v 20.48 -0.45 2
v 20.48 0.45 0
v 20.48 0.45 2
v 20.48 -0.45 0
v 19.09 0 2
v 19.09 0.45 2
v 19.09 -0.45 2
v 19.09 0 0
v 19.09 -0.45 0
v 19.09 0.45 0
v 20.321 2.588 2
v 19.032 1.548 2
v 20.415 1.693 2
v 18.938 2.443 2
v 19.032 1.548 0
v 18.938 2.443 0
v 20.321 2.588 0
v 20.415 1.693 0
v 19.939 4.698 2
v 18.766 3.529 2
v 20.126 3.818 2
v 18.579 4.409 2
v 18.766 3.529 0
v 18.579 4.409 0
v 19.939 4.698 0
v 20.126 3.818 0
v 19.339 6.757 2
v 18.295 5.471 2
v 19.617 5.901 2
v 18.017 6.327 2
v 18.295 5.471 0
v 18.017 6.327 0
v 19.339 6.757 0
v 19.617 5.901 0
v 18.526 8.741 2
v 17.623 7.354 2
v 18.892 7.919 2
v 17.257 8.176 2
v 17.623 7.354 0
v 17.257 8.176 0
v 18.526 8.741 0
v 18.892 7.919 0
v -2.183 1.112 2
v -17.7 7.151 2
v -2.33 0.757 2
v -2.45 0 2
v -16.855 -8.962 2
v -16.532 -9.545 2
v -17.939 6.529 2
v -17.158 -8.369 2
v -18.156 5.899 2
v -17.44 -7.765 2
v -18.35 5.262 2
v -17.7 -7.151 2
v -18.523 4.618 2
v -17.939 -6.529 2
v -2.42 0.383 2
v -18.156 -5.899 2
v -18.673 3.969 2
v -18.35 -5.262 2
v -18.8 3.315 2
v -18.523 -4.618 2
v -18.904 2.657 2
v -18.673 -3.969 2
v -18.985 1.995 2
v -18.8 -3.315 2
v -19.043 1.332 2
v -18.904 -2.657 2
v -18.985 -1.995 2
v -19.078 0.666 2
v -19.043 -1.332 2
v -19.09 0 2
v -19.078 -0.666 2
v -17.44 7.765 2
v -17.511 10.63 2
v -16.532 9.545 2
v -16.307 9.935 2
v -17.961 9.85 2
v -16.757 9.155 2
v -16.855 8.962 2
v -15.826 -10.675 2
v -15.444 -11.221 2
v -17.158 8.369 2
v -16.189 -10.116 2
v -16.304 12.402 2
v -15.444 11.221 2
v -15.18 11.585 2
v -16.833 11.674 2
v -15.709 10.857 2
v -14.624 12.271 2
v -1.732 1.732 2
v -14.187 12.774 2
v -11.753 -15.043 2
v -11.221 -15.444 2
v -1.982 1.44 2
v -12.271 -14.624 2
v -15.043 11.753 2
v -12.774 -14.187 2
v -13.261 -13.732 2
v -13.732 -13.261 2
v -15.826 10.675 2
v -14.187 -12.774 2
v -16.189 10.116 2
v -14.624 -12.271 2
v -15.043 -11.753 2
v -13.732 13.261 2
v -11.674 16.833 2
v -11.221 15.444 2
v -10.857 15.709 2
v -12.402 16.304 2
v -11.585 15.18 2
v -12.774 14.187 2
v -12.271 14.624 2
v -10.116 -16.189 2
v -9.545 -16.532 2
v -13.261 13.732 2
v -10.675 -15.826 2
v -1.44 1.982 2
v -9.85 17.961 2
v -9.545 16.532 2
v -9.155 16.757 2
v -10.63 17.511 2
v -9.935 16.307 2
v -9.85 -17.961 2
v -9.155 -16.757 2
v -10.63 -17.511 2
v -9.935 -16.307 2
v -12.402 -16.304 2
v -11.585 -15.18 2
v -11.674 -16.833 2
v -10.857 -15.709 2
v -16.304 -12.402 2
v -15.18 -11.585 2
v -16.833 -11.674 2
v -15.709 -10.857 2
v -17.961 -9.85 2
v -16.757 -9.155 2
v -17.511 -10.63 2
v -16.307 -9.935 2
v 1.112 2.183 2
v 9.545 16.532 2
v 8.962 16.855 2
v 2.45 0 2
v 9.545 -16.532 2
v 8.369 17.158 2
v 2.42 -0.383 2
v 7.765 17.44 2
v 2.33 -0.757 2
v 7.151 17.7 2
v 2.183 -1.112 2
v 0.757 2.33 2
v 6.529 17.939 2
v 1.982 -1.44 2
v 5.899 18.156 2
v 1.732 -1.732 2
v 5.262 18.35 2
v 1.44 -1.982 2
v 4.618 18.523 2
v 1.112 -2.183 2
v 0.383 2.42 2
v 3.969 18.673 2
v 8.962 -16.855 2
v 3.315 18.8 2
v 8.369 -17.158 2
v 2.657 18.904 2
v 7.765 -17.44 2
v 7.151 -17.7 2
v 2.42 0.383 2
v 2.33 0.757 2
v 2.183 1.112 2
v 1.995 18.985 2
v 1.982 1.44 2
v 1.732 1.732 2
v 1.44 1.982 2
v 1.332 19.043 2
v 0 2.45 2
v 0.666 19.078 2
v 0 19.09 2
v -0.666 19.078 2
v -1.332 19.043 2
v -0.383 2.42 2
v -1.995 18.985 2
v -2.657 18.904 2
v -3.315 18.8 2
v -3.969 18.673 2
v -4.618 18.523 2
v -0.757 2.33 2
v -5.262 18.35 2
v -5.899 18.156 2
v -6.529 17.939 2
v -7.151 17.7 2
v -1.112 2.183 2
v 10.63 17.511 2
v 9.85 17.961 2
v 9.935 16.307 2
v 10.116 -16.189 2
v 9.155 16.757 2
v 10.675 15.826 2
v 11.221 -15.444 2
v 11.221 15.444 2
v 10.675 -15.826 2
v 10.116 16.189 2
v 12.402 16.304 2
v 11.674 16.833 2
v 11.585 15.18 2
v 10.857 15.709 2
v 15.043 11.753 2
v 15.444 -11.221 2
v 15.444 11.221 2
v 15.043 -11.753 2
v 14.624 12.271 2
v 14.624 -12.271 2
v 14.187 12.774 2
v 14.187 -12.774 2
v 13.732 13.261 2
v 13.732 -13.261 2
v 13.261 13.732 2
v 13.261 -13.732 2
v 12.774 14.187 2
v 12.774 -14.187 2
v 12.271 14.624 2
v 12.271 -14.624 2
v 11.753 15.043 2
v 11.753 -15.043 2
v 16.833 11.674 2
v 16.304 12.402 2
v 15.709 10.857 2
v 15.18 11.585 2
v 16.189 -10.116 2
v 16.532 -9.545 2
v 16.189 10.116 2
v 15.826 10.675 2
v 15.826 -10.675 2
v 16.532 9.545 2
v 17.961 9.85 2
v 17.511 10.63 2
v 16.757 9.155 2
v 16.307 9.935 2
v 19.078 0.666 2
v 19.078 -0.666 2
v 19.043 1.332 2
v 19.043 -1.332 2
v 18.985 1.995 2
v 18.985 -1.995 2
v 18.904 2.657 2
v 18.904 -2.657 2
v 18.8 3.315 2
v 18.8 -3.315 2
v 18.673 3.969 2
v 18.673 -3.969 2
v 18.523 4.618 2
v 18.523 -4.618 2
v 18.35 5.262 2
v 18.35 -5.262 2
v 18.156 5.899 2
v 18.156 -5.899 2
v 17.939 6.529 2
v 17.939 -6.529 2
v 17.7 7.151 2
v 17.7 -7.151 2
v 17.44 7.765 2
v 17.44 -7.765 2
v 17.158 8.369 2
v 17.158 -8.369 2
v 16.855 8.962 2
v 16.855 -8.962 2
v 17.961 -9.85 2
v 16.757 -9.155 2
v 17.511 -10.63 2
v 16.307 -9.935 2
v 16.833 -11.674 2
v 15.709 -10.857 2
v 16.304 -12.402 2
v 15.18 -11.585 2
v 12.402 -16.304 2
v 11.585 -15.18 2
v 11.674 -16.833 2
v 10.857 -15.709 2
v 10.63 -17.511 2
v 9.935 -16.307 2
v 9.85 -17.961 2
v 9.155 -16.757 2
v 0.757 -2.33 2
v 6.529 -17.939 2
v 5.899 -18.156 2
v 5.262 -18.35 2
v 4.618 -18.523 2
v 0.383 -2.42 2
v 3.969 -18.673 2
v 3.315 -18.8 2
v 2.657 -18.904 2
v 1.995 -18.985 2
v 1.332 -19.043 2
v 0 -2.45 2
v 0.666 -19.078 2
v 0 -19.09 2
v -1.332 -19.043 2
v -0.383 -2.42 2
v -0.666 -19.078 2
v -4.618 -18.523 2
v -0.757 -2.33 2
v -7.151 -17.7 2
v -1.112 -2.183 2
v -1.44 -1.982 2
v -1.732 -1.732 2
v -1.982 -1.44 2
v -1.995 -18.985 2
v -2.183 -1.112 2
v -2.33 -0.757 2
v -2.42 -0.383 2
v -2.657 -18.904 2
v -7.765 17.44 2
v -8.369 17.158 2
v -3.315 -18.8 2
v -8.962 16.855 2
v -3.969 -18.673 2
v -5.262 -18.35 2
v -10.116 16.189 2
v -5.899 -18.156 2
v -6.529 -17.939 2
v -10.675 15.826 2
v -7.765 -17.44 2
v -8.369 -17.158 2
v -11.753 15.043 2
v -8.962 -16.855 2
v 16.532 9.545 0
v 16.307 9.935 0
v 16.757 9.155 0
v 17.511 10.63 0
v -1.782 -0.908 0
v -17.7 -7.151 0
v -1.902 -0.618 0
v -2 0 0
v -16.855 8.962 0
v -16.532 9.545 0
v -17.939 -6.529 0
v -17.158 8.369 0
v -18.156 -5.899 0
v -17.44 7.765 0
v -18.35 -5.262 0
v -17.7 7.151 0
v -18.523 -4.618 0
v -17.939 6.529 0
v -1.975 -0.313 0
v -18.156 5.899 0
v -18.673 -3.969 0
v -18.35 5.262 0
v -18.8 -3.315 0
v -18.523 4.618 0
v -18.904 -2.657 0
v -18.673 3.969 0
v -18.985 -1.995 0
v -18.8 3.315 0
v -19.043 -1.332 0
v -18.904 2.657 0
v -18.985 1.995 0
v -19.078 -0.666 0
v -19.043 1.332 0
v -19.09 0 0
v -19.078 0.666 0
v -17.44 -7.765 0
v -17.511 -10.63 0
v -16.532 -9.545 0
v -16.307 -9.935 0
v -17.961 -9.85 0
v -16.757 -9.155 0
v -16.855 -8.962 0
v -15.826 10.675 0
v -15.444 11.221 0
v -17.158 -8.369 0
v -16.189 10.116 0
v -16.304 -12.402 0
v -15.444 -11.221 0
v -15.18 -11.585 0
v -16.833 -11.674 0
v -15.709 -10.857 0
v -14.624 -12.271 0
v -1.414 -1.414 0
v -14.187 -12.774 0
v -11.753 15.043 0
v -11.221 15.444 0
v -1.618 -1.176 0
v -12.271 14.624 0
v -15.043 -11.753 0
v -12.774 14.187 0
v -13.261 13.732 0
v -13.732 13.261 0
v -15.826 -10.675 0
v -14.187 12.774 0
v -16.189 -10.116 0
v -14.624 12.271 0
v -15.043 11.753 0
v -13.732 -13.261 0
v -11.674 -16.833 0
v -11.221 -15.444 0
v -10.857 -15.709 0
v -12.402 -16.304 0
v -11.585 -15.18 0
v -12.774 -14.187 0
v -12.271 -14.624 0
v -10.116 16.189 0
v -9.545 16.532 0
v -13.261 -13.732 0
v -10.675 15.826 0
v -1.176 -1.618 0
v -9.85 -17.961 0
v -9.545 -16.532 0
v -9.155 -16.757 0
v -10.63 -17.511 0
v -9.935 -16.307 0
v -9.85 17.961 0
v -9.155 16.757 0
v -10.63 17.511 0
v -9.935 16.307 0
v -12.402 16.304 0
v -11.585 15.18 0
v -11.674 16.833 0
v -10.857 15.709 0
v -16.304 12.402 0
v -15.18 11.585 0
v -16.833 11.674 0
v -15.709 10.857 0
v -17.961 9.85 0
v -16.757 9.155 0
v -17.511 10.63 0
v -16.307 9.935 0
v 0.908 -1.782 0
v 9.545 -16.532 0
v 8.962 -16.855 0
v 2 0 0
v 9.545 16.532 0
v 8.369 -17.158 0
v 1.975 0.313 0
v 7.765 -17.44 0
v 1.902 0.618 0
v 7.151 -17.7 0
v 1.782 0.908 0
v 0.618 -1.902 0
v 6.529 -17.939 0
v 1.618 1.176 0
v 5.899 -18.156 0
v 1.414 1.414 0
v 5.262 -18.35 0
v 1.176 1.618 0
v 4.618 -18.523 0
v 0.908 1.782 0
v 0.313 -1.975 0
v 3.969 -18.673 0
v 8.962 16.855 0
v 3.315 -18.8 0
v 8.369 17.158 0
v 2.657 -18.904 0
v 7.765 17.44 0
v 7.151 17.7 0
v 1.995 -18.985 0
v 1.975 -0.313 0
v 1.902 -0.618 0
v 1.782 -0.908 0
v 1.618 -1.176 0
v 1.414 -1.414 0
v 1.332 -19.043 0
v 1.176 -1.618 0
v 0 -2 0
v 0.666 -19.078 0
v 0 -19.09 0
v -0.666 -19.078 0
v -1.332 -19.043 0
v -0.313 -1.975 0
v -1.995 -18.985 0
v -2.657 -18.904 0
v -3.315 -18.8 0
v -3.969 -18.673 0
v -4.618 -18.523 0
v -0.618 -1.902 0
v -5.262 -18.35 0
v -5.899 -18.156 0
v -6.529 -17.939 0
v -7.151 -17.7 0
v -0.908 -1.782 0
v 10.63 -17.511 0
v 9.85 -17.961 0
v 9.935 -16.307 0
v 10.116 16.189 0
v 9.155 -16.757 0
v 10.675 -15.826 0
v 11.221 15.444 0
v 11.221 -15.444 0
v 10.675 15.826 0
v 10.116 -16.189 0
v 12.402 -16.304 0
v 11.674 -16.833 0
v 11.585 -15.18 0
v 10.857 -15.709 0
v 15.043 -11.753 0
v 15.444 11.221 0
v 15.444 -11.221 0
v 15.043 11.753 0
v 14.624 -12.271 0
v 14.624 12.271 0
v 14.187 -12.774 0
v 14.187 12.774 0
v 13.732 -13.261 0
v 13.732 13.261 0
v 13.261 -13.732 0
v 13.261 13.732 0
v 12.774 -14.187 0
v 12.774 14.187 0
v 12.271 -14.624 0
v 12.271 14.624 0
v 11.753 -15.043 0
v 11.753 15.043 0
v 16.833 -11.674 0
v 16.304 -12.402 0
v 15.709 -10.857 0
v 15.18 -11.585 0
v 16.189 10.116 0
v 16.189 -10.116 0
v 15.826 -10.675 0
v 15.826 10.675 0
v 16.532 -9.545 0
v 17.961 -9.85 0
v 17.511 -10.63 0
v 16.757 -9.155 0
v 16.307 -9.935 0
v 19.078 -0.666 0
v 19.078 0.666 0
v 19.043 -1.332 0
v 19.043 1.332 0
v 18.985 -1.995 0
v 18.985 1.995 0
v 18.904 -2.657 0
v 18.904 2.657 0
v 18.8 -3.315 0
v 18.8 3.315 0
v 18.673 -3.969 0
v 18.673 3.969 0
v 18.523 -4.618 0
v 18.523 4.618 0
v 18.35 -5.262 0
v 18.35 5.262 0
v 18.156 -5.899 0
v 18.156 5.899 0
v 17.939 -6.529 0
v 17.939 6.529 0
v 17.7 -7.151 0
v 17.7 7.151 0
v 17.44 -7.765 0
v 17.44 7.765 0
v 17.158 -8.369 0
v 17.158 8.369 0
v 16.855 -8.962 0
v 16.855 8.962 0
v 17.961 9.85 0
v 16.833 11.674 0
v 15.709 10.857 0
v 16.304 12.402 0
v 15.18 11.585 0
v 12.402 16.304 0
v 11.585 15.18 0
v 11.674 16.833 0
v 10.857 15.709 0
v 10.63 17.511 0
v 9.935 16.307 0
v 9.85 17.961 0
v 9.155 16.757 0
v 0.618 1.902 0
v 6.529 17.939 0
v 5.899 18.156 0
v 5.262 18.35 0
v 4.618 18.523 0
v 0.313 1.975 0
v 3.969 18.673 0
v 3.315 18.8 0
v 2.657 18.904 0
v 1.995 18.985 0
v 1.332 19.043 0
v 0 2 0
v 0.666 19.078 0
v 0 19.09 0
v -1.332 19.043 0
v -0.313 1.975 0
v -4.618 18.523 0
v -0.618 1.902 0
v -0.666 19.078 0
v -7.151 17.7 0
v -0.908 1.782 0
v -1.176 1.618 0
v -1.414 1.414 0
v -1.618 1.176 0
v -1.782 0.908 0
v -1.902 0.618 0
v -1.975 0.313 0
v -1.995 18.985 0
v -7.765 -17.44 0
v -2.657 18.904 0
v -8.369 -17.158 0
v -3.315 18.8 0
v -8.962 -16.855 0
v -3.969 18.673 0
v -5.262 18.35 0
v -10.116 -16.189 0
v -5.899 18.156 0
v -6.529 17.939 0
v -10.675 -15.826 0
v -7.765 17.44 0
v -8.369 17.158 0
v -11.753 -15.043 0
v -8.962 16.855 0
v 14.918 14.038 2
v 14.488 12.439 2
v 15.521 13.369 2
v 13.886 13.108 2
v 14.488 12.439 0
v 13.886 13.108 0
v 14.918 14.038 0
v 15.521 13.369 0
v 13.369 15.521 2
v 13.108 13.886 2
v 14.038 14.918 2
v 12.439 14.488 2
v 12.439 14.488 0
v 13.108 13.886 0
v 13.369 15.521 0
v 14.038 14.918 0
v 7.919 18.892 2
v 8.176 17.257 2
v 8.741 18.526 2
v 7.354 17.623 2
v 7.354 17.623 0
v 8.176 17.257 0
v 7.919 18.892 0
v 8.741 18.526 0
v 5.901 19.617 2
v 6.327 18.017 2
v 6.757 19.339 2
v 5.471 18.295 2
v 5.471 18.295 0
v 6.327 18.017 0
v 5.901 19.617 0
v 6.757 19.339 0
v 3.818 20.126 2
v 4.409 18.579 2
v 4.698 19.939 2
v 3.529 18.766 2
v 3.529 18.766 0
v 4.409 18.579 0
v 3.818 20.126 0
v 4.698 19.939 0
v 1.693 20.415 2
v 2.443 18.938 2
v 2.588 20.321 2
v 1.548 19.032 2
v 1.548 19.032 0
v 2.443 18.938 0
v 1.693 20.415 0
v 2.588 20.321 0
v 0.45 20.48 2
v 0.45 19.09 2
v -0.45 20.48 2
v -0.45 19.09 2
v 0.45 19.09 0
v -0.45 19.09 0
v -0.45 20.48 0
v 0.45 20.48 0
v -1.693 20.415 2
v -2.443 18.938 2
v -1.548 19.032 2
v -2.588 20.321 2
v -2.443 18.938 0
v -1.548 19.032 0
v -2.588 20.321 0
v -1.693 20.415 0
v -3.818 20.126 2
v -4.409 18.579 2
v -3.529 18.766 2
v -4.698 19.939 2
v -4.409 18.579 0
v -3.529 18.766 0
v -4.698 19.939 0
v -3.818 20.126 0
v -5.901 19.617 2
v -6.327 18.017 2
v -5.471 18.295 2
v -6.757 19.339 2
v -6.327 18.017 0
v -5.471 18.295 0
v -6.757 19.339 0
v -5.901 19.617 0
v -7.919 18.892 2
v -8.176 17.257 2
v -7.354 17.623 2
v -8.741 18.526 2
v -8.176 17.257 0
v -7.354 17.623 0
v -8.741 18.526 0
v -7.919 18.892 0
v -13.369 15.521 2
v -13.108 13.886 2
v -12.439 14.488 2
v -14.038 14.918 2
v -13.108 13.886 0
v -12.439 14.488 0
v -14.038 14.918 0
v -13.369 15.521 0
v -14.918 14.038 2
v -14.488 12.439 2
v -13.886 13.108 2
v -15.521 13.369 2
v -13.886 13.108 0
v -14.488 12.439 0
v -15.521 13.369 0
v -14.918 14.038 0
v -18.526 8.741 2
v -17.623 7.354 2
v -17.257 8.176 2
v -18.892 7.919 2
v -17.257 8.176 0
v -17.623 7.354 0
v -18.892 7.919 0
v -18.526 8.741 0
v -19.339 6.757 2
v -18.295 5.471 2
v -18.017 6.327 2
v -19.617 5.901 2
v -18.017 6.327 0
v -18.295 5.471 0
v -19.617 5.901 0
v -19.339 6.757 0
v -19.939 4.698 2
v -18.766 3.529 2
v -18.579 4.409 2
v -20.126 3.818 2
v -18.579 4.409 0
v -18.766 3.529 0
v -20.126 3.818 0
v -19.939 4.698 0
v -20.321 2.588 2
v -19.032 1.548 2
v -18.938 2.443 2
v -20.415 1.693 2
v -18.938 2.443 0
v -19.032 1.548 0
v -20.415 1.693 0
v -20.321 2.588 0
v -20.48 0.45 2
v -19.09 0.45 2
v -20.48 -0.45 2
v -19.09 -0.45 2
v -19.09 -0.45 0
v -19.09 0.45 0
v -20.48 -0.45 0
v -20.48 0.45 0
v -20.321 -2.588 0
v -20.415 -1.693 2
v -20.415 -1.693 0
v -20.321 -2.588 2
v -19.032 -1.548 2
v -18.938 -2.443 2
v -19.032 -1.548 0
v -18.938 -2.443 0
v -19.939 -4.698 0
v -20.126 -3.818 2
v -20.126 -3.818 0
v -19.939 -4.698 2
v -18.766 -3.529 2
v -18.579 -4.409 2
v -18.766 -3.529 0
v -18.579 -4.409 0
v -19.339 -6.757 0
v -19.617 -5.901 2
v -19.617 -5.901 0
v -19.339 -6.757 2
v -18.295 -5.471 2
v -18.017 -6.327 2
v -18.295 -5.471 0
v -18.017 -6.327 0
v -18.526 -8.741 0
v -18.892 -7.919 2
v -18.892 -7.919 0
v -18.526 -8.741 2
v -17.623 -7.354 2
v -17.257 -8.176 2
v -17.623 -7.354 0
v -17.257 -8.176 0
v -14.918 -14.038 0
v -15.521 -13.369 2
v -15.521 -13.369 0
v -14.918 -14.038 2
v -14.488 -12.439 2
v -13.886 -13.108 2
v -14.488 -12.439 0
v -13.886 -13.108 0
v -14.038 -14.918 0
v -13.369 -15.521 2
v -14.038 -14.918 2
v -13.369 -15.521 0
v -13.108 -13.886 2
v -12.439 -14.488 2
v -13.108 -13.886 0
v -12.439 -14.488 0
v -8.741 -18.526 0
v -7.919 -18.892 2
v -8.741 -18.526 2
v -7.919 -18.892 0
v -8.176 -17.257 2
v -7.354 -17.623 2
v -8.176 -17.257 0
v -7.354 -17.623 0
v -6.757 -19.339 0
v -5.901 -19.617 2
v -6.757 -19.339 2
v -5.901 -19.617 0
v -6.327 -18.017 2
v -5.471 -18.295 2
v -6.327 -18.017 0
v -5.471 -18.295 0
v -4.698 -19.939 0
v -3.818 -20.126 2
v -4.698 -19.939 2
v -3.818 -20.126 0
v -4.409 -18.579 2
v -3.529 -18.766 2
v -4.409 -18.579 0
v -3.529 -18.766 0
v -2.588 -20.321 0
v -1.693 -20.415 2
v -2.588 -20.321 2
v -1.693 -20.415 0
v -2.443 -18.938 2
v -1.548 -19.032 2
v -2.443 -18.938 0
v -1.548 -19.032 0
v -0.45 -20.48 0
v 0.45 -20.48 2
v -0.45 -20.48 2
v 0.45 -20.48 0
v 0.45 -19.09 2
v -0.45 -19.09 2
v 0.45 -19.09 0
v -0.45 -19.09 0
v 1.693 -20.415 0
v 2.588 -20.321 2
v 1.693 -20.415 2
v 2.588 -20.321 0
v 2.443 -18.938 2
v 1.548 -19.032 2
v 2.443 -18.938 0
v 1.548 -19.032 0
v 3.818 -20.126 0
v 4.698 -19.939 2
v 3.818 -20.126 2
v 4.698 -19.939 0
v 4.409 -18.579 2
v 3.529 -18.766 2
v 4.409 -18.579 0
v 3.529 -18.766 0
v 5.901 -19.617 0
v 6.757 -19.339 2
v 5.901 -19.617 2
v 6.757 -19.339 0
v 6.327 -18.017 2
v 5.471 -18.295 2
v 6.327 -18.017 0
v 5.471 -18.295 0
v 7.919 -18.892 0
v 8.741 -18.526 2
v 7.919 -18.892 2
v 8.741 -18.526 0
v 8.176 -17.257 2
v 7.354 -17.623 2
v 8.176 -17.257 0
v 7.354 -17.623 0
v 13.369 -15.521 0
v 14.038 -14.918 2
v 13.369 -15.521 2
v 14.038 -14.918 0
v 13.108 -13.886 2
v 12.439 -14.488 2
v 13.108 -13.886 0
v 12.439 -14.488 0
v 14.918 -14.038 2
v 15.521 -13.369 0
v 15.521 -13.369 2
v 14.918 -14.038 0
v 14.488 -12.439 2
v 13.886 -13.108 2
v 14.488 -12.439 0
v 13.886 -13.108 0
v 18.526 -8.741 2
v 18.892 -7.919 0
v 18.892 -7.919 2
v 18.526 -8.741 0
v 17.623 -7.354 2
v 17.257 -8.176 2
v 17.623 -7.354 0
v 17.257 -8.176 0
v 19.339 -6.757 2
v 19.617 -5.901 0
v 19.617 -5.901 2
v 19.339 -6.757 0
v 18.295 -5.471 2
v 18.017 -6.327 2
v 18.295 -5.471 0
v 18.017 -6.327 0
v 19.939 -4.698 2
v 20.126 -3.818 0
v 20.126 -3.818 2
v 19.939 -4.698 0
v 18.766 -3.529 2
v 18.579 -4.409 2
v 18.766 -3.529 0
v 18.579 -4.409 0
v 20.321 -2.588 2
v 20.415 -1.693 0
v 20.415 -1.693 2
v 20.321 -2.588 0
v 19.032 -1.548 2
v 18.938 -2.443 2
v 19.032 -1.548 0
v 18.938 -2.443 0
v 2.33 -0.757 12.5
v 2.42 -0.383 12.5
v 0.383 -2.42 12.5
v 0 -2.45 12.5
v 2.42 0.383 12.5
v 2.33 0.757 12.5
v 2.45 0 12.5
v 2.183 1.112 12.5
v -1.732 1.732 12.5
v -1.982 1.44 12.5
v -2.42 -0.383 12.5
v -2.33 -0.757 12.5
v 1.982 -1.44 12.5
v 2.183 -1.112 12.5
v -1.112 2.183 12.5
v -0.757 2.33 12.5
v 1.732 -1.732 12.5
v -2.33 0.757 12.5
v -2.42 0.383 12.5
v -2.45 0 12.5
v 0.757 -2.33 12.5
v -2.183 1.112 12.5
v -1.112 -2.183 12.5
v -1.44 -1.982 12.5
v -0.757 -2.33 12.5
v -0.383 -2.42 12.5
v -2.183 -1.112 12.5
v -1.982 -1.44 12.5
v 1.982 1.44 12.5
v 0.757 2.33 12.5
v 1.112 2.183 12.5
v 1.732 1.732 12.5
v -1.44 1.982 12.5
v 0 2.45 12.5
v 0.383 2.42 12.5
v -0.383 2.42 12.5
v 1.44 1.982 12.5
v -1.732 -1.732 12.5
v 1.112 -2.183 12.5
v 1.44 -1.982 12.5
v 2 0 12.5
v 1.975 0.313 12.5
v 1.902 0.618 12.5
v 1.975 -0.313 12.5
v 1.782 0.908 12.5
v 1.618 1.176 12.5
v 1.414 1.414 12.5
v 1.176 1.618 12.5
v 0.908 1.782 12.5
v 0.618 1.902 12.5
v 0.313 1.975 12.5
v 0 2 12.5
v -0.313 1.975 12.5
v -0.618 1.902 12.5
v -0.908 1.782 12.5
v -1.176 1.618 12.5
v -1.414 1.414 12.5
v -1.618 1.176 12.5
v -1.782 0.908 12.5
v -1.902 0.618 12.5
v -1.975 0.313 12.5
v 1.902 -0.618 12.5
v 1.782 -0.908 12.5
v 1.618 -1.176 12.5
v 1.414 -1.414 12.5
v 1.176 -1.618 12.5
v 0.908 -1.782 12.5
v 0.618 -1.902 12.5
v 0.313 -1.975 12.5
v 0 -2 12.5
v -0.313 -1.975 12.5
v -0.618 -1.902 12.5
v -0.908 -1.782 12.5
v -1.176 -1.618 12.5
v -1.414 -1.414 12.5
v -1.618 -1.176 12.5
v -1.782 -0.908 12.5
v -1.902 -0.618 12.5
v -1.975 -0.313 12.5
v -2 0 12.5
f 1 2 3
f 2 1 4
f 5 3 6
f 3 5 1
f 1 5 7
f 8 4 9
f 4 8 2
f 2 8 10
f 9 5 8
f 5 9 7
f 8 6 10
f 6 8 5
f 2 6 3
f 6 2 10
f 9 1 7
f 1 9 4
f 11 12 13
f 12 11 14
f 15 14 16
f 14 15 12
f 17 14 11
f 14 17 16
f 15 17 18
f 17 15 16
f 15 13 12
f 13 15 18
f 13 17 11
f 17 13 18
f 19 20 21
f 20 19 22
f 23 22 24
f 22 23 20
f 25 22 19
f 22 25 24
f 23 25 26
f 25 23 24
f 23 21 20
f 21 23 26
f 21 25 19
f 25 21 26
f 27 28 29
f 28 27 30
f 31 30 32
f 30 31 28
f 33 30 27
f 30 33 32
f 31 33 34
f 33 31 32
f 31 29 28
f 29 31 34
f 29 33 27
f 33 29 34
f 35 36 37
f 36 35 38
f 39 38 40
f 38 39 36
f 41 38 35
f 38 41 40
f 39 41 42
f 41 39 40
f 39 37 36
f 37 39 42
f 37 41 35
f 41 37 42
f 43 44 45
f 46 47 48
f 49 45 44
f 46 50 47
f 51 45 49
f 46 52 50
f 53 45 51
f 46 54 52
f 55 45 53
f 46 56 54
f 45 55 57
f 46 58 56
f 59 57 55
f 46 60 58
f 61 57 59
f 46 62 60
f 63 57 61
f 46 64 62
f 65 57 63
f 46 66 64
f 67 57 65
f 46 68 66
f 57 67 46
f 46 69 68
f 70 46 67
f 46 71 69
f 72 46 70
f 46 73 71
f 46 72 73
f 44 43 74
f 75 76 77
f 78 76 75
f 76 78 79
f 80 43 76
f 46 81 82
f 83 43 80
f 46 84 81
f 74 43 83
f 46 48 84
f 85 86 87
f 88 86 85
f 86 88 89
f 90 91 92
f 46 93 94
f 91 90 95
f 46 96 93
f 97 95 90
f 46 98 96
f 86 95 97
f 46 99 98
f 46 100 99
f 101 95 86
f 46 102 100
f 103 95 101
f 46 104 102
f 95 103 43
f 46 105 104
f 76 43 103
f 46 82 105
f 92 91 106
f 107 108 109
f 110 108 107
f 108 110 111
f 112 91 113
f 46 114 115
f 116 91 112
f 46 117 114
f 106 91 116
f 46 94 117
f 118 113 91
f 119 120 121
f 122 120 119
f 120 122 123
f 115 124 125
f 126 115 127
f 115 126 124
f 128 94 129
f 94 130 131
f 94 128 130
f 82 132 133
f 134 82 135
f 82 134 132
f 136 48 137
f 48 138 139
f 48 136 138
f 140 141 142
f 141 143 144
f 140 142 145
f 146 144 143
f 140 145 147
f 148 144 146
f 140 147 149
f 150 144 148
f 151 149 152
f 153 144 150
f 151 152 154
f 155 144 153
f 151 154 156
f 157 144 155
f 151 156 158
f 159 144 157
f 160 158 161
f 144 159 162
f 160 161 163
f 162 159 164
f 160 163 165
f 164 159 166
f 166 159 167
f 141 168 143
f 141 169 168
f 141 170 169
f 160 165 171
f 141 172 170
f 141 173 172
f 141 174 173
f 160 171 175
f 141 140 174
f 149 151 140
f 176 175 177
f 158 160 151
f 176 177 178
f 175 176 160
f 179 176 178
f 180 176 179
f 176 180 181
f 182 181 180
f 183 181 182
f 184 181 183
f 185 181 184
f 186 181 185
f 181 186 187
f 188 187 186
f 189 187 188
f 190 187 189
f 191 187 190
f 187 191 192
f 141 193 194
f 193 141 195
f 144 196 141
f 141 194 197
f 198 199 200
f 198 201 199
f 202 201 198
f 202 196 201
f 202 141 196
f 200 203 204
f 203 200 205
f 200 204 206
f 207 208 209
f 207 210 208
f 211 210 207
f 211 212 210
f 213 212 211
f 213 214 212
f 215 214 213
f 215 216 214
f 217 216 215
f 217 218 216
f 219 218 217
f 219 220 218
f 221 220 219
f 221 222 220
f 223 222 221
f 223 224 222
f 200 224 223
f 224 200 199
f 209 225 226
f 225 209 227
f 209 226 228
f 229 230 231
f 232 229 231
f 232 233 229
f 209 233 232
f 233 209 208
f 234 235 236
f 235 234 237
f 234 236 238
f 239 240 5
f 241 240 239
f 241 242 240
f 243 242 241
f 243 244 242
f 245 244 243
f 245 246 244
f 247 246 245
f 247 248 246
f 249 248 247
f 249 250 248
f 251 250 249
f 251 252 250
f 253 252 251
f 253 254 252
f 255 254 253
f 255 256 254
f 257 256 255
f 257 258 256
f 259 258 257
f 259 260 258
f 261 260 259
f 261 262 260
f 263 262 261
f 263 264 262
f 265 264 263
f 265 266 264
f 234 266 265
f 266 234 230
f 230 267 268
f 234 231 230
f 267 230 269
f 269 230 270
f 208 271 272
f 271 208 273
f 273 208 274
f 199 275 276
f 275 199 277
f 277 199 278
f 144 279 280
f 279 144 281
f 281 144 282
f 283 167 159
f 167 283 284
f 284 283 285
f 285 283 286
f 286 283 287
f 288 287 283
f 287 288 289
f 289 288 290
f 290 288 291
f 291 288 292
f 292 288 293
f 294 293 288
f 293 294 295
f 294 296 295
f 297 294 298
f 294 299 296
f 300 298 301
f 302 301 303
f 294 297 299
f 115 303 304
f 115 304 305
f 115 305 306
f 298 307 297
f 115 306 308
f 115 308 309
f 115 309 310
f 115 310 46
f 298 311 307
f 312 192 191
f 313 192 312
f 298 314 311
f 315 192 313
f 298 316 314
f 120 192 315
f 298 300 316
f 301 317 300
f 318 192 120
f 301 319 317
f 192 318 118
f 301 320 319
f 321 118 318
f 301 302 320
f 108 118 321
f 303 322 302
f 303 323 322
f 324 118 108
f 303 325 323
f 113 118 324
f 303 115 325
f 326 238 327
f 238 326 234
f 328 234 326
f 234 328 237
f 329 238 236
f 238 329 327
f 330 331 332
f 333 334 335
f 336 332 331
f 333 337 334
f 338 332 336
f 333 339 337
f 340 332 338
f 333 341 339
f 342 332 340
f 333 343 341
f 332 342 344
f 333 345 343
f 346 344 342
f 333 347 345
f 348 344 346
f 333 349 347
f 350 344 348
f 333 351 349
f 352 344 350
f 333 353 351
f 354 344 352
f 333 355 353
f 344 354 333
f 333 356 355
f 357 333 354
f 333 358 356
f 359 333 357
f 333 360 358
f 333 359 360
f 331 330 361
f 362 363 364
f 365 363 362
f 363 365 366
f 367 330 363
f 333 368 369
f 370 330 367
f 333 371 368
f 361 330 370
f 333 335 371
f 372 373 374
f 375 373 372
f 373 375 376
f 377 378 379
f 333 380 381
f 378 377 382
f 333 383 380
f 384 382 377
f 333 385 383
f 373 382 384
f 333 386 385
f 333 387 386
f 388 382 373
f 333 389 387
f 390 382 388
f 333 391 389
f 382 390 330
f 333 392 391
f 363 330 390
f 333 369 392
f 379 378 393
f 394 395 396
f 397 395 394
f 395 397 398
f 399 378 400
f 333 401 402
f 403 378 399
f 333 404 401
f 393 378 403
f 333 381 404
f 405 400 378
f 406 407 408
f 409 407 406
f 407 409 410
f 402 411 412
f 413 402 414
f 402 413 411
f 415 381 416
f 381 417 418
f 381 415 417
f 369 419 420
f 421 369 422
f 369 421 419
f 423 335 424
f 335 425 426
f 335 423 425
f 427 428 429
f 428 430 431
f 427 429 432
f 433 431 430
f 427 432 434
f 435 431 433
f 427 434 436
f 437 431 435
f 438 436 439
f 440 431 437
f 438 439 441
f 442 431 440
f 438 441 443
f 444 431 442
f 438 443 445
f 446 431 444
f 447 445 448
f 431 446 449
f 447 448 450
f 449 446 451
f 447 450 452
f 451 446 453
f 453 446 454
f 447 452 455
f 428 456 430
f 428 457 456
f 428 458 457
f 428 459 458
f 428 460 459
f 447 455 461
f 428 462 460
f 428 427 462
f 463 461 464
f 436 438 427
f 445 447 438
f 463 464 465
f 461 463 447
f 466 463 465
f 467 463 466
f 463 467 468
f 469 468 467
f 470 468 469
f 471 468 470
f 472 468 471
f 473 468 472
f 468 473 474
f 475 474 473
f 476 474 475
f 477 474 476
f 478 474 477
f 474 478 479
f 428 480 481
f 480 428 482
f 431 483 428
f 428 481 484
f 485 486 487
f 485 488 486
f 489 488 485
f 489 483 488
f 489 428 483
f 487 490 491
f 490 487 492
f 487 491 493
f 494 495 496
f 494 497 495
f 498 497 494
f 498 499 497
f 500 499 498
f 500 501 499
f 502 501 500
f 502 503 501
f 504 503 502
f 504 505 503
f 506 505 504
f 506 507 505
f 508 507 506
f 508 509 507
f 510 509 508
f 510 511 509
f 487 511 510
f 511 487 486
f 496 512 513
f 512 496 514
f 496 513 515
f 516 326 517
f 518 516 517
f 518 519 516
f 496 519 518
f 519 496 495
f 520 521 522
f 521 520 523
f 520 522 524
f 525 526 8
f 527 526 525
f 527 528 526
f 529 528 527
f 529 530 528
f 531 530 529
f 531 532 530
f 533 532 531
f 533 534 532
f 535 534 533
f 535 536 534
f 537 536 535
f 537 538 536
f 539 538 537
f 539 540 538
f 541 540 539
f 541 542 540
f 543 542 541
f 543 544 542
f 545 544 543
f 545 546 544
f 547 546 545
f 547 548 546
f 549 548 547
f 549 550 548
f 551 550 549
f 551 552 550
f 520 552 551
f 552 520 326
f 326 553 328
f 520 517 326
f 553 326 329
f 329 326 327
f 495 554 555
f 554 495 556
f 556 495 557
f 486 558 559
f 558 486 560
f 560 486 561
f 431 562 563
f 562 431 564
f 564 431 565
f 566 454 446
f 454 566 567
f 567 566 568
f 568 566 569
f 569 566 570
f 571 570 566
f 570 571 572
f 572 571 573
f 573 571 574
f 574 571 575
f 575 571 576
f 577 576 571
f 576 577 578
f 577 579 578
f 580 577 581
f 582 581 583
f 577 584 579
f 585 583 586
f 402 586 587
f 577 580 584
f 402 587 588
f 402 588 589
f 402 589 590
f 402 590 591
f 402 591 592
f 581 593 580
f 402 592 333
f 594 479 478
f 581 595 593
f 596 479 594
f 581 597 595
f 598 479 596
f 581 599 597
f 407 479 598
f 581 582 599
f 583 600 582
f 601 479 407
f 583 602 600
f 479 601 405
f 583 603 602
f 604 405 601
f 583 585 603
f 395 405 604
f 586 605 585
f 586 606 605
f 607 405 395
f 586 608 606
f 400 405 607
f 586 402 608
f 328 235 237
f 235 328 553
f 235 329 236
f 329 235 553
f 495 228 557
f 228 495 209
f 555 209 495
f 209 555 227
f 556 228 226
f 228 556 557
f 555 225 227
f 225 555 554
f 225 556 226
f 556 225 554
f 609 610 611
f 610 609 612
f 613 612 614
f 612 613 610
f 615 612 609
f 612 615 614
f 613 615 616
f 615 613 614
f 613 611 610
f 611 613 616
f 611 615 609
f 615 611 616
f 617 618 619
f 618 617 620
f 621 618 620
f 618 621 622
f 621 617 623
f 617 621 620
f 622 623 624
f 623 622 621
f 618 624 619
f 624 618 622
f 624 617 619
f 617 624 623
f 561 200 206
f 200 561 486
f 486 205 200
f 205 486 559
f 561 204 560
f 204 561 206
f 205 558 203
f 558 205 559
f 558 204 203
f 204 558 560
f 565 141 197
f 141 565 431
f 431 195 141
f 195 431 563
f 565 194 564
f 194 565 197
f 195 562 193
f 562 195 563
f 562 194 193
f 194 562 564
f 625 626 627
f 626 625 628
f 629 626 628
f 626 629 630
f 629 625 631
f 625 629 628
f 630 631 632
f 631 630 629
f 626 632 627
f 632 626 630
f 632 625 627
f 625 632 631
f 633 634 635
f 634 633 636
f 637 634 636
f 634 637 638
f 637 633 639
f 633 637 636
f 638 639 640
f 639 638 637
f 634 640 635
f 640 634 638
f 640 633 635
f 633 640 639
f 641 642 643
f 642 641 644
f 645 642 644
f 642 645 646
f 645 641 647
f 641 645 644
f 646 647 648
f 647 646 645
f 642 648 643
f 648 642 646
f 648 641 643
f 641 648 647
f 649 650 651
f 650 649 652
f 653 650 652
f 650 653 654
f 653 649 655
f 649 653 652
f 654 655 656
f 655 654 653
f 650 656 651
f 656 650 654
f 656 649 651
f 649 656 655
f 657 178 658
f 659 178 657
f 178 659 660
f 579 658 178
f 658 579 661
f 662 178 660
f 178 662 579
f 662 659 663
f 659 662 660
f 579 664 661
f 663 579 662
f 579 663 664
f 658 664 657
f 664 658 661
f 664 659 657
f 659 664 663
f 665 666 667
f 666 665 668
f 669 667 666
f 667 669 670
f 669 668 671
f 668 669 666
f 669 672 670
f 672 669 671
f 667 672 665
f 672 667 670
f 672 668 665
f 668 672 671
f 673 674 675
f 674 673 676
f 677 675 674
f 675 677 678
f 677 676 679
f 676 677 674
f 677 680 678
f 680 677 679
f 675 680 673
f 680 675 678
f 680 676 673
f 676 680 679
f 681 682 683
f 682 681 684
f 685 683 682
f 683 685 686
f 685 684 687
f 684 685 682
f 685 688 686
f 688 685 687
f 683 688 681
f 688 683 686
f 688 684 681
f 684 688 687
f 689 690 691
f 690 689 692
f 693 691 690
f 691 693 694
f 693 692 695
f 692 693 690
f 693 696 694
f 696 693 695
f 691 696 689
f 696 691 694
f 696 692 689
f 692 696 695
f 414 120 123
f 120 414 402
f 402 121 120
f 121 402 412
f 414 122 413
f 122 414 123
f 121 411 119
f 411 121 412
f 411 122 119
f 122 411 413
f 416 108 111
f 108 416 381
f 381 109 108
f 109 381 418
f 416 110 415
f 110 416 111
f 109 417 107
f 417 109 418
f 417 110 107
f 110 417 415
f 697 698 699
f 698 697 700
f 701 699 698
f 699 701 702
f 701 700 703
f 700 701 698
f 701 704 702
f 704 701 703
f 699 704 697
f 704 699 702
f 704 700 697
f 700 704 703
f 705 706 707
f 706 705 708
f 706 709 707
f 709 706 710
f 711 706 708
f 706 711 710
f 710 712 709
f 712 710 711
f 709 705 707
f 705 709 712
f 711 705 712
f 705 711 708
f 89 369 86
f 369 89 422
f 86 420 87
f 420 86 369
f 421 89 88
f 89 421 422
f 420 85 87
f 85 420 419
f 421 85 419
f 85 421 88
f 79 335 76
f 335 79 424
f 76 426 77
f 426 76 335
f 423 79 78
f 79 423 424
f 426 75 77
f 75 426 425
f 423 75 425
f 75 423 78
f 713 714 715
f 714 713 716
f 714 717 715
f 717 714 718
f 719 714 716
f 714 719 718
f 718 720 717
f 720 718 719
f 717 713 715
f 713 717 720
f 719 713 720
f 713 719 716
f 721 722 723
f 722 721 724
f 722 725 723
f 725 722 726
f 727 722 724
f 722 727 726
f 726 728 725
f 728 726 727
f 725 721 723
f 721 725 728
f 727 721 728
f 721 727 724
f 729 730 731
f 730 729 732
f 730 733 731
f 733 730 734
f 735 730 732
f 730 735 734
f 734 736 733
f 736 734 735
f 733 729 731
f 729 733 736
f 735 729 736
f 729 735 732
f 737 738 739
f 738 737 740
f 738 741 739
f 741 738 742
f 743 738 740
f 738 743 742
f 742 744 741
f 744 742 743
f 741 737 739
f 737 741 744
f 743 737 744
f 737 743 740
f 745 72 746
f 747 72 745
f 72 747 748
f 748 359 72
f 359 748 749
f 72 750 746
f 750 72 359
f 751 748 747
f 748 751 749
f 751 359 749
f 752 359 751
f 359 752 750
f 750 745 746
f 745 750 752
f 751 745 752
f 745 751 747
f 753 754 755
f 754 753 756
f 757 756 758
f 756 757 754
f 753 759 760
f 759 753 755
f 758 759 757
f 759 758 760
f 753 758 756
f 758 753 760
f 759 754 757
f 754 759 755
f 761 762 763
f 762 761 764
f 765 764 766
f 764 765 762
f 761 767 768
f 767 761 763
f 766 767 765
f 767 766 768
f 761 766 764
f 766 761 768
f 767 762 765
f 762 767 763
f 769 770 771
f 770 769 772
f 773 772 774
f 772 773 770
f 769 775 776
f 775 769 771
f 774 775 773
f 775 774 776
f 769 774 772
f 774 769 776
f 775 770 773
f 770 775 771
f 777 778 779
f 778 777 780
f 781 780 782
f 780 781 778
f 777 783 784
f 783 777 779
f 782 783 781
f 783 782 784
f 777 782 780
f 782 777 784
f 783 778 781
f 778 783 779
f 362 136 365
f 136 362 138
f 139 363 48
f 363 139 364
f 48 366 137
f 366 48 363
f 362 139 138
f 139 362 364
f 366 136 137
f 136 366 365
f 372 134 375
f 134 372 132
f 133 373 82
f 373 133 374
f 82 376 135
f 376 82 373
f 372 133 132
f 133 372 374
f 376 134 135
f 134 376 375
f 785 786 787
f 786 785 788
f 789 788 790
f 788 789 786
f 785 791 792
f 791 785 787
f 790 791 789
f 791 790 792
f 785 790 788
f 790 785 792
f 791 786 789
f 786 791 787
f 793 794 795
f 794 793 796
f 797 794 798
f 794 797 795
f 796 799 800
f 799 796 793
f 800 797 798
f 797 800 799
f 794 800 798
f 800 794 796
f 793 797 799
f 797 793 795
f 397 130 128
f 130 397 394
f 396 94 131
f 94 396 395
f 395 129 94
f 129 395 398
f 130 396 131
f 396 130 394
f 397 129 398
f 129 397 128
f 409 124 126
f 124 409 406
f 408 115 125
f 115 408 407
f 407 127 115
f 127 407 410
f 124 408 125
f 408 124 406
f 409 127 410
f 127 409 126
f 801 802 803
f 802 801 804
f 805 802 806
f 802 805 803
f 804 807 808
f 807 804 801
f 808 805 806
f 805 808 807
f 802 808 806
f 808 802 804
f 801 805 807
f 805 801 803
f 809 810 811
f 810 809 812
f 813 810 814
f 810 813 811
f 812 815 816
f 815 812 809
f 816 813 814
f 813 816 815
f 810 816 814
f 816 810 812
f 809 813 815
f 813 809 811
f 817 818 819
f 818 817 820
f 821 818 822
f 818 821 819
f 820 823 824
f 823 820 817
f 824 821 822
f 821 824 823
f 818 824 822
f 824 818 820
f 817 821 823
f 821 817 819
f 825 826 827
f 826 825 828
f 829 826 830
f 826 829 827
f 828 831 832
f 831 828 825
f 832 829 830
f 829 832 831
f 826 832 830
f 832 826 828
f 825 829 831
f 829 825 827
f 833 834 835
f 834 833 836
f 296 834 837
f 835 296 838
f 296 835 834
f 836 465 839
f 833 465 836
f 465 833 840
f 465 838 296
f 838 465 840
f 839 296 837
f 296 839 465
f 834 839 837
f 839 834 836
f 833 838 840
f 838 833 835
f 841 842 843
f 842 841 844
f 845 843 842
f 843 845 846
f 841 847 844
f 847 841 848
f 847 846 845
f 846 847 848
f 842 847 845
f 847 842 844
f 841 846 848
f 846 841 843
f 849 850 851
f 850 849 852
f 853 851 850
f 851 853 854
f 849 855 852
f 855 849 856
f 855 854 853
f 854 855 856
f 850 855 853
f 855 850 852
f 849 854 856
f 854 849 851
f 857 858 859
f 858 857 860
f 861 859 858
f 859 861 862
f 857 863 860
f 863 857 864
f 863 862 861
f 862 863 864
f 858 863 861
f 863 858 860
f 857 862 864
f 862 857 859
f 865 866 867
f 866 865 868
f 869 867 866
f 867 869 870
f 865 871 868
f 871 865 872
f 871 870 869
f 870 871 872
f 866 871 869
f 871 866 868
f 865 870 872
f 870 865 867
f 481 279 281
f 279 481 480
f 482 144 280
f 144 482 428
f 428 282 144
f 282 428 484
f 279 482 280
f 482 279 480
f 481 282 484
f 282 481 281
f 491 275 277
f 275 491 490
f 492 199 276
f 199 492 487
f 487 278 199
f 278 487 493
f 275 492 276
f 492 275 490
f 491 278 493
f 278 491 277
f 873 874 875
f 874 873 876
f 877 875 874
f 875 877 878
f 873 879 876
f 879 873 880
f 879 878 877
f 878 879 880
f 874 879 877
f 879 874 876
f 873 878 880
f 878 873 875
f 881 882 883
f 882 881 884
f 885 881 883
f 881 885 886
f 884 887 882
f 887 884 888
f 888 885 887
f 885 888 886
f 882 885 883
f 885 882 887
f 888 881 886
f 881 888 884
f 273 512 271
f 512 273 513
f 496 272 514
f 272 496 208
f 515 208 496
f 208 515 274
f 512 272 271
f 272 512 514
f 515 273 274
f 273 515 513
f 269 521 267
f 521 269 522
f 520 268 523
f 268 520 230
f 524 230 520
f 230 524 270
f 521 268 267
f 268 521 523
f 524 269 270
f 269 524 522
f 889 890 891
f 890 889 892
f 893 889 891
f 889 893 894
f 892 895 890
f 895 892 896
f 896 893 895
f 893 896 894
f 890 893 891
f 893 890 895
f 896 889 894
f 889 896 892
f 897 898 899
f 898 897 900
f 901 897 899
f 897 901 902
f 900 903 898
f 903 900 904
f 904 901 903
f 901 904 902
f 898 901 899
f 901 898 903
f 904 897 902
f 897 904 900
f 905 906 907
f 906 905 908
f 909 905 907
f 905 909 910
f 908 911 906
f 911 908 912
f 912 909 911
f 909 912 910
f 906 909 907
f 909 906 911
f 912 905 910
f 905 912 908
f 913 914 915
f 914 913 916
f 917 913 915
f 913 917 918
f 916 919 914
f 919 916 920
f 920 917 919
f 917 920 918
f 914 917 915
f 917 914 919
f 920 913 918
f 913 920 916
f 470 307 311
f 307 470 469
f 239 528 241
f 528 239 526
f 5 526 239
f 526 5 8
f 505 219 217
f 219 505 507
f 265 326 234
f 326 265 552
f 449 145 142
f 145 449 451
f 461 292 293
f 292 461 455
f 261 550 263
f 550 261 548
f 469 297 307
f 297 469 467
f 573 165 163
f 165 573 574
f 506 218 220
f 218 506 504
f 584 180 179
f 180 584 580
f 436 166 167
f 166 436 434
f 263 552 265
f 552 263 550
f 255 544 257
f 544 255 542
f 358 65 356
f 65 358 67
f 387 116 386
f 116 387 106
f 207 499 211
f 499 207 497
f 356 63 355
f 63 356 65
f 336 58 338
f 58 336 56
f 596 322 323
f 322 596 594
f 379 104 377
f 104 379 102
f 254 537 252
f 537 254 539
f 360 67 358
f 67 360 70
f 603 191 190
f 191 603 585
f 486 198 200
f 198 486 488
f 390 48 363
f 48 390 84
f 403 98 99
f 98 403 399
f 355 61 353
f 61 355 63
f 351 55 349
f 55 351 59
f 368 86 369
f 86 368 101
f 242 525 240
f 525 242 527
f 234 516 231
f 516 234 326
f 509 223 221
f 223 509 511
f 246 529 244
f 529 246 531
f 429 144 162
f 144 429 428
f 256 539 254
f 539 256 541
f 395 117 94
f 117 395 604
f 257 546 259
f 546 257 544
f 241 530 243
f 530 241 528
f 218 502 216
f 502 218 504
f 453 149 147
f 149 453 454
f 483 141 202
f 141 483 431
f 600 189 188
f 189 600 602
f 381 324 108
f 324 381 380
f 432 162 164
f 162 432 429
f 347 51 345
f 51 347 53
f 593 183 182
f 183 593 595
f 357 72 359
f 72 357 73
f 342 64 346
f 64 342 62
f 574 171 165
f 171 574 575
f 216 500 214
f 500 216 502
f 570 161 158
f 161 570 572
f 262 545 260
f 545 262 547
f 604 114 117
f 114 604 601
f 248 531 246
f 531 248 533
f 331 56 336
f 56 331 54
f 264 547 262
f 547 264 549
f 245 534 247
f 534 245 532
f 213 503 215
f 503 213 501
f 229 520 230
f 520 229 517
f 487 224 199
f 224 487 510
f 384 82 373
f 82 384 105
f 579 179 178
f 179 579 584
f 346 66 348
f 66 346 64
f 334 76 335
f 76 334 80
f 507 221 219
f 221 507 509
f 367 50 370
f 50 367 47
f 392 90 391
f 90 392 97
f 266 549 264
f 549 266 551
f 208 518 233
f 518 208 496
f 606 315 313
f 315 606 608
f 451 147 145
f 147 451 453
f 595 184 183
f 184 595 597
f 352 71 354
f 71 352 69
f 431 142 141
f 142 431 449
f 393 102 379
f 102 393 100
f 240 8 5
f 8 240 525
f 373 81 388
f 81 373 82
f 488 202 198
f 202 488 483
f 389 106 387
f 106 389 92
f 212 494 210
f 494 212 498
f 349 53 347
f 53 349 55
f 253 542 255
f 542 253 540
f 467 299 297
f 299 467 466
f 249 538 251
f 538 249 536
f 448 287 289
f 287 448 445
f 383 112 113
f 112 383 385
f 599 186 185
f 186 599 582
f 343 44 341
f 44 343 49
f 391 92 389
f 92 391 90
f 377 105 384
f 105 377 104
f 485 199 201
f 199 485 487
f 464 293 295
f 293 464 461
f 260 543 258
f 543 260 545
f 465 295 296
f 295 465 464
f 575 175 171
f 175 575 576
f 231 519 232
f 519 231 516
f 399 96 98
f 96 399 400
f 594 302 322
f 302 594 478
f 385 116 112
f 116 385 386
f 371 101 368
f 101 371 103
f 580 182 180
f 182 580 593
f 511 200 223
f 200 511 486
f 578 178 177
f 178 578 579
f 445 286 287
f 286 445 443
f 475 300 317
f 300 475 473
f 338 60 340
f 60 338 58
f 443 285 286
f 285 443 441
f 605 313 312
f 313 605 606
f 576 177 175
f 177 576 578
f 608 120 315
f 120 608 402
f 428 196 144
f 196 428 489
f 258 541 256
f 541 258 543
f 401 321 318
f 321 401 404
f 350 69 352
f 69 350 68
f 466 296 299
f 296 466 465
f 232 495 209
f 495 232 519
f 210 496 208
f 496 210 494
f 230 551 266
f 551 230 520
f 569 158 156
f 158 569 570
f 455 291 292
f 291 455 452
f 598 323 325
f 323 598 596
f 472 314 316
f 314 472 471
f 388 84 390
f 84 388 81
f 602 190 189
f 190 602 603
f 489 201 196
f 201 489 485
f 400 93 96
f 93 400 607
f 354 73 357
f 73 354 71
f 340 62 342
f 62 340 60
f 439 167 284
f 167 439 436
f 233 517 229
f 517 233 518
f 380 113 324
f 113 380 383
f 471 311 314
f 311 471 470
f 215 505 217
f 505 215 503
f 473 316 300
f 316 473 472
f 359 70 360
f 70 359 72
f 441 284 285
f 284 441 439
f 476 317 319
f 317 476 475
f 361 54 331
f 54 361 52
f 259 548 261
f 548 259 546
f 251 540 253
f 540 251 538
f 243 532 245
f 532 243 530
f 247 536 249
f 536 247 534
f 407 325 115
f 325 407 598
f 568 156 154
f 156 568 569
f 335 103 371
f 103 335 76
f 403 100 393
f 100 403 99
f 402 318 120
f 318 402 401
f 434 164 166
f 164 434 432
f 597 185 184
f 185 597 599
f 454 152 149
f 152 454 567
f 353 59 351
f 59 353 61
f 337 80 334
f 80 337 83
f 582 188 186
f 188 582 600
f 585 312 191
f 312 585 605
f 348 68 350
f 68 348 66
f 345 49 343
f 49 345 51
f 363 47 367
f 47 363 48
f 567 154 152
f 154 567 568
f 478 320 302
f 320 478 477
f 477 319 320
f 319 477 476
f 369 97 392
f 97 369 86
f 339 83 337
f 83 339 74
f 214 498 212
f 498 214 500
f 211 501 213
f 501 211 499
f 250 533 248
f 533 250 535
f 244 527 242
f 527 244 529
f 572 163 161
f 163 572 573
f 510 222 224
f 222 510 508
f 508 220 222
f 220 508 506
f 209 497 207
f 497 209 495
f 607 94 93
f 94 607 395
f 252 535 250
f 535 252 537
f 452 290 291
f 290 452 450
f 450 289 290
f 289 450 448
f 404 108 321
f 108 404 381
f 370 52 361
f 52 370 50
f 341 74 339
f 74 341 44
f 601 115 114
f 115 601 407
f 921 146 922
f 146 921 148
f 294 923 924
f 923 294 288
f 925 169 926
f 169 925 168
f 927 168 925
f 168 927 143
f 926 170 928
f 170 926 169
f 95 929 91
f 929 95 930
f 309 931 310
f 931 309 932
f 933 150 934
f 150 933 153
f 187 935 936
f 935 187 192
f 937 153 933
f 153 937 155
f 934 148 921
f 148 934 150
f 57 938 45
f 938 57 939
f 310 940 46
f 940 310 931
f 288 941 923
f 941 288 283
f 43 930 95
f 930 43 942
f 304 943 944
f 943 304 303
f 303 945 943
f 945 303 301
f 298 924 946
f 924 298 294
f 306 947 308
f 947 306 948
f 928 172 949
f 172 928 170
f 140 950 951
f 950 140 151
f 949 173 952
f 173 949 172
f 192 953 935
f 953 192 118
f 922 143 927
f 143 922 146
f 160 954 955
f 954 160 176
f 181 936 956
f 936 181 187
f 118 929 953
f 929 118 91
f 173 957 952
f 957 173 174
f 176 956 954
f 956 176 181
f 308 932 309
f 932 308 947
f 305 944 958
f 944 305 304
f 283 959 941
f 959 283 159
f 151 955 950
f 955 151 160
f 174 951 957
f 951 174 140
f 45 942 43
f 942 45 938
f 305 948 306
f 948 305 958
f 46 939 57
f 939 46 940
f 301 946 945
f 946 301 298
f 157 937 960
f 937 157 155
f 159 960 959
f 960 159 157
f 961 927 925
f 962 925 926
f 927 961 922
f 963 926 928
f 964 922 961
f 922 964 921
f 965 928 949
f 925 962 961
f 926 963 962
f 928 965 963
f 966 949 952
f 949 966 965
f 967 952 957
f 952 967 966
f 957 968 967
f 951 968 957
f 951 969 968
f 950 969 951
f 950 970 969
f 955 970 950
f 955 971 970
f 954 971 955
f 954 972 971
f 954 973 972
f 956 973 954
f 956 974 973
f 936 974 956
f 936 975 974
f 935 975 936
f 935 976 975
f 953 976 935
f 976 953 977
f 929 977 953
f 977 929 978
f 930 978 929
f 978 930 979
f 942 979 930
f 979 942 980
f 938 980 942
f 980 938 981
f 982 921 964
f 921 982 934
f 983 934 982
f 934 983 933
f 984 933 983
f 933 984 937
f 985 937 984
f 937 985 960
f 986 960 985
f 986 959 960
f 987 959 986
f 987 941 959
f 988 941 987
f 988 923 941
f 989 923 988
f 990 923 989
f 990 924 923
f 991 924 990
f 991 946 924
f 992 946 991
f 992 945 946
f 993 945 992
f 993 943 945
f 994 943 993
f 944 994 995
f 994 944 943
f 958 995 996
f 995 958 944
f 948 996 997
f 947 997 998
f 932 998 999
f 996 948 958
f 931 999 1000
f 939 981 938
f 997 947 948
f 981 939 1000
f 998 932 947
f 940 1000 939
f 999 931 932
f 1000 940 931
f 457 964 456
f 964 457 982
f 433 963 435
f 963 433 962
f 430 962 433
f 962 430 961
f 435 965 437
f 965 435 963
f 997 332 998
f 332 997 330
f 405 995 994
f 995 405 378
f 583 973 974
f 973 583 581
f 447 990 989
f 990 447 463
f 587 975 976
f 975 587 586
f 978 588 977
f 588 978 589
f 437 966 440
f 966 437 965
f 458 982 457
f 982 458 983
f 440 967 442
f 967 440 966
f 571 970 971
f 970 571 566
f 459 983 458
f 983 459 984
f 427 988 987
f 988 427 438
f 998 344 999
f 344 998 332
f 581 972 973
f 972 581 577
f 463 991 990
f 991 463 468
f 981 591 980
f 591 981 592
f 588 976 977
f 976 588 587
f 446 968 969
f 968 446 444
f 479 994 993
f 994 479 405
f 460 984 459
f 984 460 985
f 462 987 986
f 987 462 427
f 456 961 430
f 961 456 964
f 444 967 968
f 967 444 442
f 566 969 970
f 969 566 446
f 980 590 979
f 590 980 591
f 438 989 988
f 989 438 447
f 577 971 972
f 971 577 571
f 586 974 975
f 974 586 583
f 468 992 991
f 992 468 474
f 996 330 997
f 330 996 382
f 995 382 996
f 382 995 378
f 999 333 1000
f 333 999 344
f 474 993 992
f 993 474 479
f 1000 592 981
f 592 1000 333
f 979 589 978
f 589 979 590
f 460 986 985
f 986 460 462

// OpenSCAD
// part_id: sp8
// name: SP8 large gear (sp2 axle OD)
// source_drawing_ids: DRW-022
// units: mm
// revision: 0.1-drw022
// SPDX-License-Identifier: MIT
//
// Dimensions from DRW-022 sheet 6:
//   Tooth tip radius R20.48 (OD 40.96), root radius R19.09 (root_d 38.18).
//   Press-fit boss: Ø4.0 bore, Ø4.9 boss OD, 12.5 mm fitted depth onto sp2 axle.
//   Tooth ring thickness: 2.0 mm.

module sp8_tooth_ring(root_d = 38.18, tip_d = 40.96, tooth_count = 60, thickness = 2.0, tooth_w = 0.9) {
    union() {
        cylinder(d = root_d, h = thickness, center = false, $fn = 180);
        for (a = [0 : 360 / tooth_count : 360 - 360 / tooth_count]) {
            rotate([0, 0, a])
                translate([root_d / 2, -tooth_w / 2, 0])
                    cube([(tip_d - root_d) / 2, tooth_w, thickness], center = false);
        }
    }
}

module part_sp8(
    tip_d     = 40.96,
    root_d    = 38.18,
    thickness = 2.0,
    tooth_count = 60,
    boss_od   = 4.9,
    bore_d    = 4.0,
    boss_h    = 12.5
) {
    union() {
        // Tooth ring with central boss clearance cut.
        difference() {
            sp8_tooth_ring(
                root_d = root_d, tip_d = tip_d,
                tooth_count = tooth_count, thickness = thickness
            );
            translate([0, 0, -0.1]) cylinder(d = boss_od, h = thickness + 0.2, center = false, $fn = 40);
        }
        // Press-fit boss extending below gear face.
        difference() {
            cylinder(d = boss_od, h = boss_h, center = false, $fn = 40);
            translate([0, 0, -0.1]) cylinder(d = bore_d, h = boss_h + 0.2, center = false, $fn = 40);
        }
    }
}


// ---- "main guard" ----
// Default to previewing when opened directly:
if (is_undef(__LIB_MODE__)) {
    part_sp8();
}
